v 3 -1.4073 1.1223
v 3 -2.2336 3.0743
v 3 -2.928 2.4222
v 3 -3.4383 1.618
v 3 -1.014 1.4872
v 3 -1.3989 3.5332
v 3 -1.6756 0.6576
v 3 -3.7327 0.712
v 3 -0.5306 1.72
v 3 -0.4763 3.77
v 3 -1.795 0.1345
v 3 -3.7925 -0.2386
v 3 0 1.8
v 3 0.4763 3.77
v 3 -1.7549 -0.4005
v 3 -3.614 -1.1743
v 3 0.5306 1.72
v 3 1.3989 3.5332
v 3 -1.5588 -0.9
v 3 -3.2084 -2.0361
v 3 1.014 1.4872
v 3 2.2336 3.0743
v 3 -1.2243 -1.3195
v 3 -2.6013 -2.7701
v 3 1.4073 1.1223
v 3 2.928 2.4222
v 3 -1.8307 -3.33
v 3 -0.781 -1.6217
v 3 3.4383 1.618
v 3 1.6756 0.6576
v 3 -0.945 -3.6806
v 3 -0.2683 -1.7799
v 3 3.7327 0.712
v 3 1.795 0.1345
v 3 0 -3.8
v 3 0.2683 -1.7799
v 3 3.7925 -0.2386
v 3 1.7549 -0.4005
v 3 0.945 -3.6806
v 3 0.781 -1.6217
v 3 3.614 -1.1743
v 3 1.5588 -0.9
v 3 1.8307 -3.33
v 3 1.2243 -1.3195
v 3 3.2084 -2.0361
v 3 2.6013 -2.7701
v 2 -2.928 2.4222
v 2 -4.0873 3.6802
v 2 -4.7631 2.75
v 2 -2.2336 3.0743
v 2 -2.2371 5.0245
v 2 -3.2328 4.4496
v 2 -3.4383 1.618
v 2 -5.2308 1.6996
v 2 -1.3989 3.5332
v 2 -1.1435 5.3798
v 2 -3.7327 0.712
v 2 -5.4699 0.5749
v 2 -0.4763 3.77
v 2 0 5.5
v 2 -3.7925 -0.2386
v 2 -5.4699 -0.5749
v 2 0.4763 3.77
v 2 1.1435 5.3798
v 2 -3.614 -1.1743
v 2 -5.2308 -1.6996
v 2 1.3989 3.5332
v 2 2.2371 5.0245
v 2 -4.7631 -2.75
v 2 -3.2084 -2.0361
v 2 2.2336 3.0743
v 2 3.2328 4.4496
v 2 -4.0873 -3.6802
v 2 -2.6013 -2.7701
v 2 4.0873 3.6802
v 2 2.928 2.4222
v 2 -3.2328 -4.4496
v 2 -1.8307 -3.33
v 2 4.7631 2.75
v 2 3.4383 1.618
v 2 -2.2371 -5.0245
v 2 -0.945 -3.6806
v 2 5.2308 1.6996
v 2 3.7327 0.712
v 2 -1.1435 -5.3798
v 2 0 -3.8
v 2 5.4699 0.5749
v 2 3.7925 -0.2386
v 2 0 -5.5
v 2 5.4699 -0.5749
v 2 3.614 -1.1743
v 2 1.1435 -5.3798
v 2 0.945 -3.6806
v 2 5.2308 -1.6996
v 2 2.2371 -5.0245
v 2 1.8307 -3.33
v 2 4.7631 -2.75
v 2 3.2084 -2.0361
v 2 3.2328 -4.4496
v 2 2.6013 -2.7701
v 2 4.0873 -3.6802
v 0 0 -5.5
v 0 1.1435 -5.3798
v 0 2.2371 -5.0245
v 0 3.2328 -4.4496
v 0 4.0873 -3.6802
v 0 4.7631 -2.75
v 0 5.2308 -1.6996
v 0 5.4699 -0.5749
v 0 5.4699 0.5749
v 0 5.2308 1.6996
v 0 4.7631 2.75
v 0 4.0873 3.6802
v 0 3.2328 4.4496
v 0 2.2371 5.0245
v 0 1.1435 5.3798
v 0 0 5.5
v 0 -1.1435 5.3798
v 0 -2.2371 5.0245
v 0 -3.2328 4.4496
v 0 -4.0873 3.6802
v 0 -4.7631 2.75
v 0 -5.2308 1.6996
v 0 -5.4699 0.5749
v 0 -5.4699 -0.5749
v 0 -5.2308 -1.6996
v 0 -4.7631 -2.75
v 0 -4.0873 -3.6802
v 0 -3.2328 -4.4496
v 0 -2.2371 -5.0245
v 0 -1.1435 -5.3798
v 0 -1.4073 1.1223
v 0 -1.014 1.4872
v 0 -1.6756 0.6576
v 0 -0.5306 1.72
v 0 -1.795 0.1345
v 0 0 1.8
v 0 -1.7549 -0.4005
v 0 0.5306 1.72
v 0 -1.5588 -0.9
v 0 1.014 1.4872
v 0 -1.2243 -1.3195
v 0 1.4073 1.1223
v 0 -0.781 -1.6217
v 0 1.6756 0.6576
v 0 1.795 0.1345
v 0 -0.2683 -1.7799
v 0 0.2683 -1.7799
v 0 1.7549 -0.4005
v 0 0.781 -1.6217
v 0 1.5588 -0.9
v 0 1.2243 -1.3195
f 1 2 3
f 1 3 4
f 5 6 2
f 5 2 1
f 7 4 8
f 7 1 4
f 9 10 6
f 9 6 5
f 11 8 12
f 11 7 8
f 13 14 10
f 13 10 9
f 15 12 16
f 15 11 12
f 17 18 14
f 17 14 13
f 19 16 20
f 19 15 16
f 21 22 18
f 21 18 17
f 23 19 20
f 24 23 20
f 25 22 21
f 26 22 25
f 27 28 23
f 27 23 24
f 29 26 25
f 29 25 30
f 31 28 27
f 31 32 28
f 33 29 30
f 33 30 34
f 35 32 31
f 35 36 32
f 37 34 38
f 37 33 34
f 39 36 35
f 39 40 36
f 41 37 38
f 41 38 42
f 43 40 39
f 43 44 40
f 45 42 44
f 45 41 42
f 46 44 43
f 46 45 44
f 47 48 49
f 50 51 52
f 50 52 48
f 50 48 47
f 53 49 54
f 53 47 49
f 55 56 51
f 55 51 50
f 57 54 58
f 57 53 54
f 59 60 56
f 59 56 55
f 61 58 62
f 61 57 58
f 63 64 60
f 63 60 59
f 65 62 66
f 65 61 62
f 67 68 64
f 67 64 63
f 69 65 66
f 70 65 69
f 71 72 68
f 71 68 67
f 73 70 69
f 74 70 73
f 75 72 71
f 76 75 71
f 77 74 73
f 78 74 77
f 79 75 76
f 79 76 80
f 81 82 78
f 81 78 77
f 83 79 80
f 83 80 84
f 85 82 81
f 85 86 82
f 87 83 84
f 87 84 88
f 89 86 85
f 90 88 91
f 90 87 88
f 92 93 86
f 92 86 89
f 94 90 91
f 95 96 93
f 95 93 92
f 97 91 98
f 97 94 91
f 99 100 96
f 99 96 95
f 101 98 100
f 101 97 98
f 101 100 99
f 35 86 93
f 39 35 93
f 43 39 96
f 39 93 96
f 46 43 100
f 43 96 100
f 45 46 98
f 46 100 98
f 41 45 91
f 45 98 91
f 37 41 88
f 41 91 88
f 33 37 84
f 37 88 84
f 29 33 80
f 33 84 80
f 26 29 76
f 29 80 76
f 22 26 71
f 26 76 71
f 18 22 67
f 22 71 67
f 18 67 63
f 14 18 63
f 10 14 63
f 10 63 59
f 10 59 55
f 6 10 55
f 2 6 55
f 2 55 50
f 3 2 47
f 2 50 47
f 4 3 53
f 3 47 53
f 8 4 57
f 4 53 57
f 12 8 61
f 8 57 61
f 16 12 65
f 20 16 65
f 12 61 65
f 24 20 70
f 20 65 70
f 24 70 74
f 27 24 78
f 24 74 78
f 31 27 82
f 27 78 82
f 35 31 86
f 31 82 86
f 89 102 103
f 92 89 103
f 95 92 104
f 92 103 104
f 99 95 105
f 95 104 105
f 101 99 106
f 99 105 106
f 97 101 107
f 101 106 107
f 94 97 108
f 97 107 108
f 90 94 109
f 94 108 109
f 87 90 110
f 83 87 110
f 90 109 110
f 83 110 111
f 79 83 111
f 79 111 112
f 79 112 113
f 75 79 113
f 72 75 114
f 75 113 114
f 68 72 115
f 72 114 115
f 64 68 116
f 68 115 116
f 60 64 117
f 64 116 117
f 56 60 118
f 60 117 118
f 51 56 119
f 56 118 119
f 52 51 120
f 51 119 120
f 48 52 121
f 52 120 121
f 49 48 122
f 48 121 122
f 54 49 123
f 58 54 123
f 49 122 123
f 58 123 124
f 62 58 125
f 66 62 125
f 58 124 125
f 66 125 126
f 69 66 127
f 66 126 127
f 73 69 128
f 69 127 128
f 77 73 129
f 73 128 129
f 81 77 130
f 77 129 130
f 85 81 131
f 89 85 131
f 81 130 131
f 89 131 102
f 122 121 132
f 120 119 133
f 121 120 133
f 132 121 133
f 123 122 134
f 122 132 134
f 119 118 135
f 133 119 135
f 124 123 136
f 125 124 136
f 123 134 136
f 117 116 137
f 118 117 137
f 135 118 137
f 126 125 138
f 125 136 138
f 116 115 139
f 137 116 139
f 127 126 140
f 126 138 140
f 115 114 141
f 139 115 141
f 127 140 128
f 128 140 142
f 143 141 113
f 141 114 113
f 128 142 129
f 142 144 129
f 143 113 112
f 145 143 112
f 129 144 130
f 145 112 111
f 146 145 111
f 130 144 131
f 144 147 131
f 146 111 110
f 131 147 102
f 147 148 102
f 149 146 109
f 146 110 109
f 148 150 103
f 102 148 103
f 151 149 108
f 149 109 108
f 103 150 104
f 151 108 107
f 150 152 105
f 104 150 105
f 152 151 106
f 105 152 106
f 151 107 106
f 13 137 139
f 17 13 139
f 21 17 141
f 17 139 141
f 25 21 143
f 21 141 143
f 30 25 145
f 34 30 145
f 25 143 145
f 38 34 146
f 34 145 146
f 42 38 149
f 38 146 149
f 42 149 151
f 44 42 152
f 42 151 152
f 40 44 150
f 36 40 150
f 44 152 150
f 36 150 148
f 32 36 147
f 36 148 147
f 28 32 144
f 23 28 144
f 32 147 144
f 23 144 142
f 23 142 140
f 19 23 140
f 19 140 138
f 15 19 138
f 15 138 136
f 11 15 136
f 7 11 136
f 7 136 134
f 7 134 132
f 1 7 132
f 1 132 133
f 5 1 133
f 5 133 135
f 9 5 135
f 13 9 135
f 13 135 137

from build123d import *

# Parameters (mm, degrees)
SKETCH1_R           = 5.5
BOSS_EXTRUDE1_DEPTH = 2
SKETCH2_R           = 3.8
BOSS_EXTRUDE2_DEPTH = 1
SKETCH3_R           = 1.8
CUT_EXTRUDE1_DEPTH  = 20


with BuildPart() as part:
    # Sketch1 → Boss-Extrude1 (new body)
    with BuildSketch(Plane(origin=(0, 0, 0), x_dir=(0, 0, -1), z_dir=(1, 0, 0))):
        Circle(SKETCH1_R)
    extrude(amount=BOSS_EXTRUDE1_DEPTH)

    # Sketch2 → Boss-Extrude2 (add)
    with BuildSketch(Plane(origin=(2, 0, 0), x_dir=(0, 0, -1), z_dir=(1, 0, 0))):
        Circle(SKETCH2_R)
    extrude(amount=BOSS_EXTRUDE2_DEPTH)

    # Sketch3 → Cut-Extrude1 (cut)
    with BuildSketch(Plane.ZY):
        Circle(SKETCH3_R)
    extrude(amount=-CUT_EXTRUDE1_DEPTH, mode=Mode.SUBTRACT)


solid = part.part
